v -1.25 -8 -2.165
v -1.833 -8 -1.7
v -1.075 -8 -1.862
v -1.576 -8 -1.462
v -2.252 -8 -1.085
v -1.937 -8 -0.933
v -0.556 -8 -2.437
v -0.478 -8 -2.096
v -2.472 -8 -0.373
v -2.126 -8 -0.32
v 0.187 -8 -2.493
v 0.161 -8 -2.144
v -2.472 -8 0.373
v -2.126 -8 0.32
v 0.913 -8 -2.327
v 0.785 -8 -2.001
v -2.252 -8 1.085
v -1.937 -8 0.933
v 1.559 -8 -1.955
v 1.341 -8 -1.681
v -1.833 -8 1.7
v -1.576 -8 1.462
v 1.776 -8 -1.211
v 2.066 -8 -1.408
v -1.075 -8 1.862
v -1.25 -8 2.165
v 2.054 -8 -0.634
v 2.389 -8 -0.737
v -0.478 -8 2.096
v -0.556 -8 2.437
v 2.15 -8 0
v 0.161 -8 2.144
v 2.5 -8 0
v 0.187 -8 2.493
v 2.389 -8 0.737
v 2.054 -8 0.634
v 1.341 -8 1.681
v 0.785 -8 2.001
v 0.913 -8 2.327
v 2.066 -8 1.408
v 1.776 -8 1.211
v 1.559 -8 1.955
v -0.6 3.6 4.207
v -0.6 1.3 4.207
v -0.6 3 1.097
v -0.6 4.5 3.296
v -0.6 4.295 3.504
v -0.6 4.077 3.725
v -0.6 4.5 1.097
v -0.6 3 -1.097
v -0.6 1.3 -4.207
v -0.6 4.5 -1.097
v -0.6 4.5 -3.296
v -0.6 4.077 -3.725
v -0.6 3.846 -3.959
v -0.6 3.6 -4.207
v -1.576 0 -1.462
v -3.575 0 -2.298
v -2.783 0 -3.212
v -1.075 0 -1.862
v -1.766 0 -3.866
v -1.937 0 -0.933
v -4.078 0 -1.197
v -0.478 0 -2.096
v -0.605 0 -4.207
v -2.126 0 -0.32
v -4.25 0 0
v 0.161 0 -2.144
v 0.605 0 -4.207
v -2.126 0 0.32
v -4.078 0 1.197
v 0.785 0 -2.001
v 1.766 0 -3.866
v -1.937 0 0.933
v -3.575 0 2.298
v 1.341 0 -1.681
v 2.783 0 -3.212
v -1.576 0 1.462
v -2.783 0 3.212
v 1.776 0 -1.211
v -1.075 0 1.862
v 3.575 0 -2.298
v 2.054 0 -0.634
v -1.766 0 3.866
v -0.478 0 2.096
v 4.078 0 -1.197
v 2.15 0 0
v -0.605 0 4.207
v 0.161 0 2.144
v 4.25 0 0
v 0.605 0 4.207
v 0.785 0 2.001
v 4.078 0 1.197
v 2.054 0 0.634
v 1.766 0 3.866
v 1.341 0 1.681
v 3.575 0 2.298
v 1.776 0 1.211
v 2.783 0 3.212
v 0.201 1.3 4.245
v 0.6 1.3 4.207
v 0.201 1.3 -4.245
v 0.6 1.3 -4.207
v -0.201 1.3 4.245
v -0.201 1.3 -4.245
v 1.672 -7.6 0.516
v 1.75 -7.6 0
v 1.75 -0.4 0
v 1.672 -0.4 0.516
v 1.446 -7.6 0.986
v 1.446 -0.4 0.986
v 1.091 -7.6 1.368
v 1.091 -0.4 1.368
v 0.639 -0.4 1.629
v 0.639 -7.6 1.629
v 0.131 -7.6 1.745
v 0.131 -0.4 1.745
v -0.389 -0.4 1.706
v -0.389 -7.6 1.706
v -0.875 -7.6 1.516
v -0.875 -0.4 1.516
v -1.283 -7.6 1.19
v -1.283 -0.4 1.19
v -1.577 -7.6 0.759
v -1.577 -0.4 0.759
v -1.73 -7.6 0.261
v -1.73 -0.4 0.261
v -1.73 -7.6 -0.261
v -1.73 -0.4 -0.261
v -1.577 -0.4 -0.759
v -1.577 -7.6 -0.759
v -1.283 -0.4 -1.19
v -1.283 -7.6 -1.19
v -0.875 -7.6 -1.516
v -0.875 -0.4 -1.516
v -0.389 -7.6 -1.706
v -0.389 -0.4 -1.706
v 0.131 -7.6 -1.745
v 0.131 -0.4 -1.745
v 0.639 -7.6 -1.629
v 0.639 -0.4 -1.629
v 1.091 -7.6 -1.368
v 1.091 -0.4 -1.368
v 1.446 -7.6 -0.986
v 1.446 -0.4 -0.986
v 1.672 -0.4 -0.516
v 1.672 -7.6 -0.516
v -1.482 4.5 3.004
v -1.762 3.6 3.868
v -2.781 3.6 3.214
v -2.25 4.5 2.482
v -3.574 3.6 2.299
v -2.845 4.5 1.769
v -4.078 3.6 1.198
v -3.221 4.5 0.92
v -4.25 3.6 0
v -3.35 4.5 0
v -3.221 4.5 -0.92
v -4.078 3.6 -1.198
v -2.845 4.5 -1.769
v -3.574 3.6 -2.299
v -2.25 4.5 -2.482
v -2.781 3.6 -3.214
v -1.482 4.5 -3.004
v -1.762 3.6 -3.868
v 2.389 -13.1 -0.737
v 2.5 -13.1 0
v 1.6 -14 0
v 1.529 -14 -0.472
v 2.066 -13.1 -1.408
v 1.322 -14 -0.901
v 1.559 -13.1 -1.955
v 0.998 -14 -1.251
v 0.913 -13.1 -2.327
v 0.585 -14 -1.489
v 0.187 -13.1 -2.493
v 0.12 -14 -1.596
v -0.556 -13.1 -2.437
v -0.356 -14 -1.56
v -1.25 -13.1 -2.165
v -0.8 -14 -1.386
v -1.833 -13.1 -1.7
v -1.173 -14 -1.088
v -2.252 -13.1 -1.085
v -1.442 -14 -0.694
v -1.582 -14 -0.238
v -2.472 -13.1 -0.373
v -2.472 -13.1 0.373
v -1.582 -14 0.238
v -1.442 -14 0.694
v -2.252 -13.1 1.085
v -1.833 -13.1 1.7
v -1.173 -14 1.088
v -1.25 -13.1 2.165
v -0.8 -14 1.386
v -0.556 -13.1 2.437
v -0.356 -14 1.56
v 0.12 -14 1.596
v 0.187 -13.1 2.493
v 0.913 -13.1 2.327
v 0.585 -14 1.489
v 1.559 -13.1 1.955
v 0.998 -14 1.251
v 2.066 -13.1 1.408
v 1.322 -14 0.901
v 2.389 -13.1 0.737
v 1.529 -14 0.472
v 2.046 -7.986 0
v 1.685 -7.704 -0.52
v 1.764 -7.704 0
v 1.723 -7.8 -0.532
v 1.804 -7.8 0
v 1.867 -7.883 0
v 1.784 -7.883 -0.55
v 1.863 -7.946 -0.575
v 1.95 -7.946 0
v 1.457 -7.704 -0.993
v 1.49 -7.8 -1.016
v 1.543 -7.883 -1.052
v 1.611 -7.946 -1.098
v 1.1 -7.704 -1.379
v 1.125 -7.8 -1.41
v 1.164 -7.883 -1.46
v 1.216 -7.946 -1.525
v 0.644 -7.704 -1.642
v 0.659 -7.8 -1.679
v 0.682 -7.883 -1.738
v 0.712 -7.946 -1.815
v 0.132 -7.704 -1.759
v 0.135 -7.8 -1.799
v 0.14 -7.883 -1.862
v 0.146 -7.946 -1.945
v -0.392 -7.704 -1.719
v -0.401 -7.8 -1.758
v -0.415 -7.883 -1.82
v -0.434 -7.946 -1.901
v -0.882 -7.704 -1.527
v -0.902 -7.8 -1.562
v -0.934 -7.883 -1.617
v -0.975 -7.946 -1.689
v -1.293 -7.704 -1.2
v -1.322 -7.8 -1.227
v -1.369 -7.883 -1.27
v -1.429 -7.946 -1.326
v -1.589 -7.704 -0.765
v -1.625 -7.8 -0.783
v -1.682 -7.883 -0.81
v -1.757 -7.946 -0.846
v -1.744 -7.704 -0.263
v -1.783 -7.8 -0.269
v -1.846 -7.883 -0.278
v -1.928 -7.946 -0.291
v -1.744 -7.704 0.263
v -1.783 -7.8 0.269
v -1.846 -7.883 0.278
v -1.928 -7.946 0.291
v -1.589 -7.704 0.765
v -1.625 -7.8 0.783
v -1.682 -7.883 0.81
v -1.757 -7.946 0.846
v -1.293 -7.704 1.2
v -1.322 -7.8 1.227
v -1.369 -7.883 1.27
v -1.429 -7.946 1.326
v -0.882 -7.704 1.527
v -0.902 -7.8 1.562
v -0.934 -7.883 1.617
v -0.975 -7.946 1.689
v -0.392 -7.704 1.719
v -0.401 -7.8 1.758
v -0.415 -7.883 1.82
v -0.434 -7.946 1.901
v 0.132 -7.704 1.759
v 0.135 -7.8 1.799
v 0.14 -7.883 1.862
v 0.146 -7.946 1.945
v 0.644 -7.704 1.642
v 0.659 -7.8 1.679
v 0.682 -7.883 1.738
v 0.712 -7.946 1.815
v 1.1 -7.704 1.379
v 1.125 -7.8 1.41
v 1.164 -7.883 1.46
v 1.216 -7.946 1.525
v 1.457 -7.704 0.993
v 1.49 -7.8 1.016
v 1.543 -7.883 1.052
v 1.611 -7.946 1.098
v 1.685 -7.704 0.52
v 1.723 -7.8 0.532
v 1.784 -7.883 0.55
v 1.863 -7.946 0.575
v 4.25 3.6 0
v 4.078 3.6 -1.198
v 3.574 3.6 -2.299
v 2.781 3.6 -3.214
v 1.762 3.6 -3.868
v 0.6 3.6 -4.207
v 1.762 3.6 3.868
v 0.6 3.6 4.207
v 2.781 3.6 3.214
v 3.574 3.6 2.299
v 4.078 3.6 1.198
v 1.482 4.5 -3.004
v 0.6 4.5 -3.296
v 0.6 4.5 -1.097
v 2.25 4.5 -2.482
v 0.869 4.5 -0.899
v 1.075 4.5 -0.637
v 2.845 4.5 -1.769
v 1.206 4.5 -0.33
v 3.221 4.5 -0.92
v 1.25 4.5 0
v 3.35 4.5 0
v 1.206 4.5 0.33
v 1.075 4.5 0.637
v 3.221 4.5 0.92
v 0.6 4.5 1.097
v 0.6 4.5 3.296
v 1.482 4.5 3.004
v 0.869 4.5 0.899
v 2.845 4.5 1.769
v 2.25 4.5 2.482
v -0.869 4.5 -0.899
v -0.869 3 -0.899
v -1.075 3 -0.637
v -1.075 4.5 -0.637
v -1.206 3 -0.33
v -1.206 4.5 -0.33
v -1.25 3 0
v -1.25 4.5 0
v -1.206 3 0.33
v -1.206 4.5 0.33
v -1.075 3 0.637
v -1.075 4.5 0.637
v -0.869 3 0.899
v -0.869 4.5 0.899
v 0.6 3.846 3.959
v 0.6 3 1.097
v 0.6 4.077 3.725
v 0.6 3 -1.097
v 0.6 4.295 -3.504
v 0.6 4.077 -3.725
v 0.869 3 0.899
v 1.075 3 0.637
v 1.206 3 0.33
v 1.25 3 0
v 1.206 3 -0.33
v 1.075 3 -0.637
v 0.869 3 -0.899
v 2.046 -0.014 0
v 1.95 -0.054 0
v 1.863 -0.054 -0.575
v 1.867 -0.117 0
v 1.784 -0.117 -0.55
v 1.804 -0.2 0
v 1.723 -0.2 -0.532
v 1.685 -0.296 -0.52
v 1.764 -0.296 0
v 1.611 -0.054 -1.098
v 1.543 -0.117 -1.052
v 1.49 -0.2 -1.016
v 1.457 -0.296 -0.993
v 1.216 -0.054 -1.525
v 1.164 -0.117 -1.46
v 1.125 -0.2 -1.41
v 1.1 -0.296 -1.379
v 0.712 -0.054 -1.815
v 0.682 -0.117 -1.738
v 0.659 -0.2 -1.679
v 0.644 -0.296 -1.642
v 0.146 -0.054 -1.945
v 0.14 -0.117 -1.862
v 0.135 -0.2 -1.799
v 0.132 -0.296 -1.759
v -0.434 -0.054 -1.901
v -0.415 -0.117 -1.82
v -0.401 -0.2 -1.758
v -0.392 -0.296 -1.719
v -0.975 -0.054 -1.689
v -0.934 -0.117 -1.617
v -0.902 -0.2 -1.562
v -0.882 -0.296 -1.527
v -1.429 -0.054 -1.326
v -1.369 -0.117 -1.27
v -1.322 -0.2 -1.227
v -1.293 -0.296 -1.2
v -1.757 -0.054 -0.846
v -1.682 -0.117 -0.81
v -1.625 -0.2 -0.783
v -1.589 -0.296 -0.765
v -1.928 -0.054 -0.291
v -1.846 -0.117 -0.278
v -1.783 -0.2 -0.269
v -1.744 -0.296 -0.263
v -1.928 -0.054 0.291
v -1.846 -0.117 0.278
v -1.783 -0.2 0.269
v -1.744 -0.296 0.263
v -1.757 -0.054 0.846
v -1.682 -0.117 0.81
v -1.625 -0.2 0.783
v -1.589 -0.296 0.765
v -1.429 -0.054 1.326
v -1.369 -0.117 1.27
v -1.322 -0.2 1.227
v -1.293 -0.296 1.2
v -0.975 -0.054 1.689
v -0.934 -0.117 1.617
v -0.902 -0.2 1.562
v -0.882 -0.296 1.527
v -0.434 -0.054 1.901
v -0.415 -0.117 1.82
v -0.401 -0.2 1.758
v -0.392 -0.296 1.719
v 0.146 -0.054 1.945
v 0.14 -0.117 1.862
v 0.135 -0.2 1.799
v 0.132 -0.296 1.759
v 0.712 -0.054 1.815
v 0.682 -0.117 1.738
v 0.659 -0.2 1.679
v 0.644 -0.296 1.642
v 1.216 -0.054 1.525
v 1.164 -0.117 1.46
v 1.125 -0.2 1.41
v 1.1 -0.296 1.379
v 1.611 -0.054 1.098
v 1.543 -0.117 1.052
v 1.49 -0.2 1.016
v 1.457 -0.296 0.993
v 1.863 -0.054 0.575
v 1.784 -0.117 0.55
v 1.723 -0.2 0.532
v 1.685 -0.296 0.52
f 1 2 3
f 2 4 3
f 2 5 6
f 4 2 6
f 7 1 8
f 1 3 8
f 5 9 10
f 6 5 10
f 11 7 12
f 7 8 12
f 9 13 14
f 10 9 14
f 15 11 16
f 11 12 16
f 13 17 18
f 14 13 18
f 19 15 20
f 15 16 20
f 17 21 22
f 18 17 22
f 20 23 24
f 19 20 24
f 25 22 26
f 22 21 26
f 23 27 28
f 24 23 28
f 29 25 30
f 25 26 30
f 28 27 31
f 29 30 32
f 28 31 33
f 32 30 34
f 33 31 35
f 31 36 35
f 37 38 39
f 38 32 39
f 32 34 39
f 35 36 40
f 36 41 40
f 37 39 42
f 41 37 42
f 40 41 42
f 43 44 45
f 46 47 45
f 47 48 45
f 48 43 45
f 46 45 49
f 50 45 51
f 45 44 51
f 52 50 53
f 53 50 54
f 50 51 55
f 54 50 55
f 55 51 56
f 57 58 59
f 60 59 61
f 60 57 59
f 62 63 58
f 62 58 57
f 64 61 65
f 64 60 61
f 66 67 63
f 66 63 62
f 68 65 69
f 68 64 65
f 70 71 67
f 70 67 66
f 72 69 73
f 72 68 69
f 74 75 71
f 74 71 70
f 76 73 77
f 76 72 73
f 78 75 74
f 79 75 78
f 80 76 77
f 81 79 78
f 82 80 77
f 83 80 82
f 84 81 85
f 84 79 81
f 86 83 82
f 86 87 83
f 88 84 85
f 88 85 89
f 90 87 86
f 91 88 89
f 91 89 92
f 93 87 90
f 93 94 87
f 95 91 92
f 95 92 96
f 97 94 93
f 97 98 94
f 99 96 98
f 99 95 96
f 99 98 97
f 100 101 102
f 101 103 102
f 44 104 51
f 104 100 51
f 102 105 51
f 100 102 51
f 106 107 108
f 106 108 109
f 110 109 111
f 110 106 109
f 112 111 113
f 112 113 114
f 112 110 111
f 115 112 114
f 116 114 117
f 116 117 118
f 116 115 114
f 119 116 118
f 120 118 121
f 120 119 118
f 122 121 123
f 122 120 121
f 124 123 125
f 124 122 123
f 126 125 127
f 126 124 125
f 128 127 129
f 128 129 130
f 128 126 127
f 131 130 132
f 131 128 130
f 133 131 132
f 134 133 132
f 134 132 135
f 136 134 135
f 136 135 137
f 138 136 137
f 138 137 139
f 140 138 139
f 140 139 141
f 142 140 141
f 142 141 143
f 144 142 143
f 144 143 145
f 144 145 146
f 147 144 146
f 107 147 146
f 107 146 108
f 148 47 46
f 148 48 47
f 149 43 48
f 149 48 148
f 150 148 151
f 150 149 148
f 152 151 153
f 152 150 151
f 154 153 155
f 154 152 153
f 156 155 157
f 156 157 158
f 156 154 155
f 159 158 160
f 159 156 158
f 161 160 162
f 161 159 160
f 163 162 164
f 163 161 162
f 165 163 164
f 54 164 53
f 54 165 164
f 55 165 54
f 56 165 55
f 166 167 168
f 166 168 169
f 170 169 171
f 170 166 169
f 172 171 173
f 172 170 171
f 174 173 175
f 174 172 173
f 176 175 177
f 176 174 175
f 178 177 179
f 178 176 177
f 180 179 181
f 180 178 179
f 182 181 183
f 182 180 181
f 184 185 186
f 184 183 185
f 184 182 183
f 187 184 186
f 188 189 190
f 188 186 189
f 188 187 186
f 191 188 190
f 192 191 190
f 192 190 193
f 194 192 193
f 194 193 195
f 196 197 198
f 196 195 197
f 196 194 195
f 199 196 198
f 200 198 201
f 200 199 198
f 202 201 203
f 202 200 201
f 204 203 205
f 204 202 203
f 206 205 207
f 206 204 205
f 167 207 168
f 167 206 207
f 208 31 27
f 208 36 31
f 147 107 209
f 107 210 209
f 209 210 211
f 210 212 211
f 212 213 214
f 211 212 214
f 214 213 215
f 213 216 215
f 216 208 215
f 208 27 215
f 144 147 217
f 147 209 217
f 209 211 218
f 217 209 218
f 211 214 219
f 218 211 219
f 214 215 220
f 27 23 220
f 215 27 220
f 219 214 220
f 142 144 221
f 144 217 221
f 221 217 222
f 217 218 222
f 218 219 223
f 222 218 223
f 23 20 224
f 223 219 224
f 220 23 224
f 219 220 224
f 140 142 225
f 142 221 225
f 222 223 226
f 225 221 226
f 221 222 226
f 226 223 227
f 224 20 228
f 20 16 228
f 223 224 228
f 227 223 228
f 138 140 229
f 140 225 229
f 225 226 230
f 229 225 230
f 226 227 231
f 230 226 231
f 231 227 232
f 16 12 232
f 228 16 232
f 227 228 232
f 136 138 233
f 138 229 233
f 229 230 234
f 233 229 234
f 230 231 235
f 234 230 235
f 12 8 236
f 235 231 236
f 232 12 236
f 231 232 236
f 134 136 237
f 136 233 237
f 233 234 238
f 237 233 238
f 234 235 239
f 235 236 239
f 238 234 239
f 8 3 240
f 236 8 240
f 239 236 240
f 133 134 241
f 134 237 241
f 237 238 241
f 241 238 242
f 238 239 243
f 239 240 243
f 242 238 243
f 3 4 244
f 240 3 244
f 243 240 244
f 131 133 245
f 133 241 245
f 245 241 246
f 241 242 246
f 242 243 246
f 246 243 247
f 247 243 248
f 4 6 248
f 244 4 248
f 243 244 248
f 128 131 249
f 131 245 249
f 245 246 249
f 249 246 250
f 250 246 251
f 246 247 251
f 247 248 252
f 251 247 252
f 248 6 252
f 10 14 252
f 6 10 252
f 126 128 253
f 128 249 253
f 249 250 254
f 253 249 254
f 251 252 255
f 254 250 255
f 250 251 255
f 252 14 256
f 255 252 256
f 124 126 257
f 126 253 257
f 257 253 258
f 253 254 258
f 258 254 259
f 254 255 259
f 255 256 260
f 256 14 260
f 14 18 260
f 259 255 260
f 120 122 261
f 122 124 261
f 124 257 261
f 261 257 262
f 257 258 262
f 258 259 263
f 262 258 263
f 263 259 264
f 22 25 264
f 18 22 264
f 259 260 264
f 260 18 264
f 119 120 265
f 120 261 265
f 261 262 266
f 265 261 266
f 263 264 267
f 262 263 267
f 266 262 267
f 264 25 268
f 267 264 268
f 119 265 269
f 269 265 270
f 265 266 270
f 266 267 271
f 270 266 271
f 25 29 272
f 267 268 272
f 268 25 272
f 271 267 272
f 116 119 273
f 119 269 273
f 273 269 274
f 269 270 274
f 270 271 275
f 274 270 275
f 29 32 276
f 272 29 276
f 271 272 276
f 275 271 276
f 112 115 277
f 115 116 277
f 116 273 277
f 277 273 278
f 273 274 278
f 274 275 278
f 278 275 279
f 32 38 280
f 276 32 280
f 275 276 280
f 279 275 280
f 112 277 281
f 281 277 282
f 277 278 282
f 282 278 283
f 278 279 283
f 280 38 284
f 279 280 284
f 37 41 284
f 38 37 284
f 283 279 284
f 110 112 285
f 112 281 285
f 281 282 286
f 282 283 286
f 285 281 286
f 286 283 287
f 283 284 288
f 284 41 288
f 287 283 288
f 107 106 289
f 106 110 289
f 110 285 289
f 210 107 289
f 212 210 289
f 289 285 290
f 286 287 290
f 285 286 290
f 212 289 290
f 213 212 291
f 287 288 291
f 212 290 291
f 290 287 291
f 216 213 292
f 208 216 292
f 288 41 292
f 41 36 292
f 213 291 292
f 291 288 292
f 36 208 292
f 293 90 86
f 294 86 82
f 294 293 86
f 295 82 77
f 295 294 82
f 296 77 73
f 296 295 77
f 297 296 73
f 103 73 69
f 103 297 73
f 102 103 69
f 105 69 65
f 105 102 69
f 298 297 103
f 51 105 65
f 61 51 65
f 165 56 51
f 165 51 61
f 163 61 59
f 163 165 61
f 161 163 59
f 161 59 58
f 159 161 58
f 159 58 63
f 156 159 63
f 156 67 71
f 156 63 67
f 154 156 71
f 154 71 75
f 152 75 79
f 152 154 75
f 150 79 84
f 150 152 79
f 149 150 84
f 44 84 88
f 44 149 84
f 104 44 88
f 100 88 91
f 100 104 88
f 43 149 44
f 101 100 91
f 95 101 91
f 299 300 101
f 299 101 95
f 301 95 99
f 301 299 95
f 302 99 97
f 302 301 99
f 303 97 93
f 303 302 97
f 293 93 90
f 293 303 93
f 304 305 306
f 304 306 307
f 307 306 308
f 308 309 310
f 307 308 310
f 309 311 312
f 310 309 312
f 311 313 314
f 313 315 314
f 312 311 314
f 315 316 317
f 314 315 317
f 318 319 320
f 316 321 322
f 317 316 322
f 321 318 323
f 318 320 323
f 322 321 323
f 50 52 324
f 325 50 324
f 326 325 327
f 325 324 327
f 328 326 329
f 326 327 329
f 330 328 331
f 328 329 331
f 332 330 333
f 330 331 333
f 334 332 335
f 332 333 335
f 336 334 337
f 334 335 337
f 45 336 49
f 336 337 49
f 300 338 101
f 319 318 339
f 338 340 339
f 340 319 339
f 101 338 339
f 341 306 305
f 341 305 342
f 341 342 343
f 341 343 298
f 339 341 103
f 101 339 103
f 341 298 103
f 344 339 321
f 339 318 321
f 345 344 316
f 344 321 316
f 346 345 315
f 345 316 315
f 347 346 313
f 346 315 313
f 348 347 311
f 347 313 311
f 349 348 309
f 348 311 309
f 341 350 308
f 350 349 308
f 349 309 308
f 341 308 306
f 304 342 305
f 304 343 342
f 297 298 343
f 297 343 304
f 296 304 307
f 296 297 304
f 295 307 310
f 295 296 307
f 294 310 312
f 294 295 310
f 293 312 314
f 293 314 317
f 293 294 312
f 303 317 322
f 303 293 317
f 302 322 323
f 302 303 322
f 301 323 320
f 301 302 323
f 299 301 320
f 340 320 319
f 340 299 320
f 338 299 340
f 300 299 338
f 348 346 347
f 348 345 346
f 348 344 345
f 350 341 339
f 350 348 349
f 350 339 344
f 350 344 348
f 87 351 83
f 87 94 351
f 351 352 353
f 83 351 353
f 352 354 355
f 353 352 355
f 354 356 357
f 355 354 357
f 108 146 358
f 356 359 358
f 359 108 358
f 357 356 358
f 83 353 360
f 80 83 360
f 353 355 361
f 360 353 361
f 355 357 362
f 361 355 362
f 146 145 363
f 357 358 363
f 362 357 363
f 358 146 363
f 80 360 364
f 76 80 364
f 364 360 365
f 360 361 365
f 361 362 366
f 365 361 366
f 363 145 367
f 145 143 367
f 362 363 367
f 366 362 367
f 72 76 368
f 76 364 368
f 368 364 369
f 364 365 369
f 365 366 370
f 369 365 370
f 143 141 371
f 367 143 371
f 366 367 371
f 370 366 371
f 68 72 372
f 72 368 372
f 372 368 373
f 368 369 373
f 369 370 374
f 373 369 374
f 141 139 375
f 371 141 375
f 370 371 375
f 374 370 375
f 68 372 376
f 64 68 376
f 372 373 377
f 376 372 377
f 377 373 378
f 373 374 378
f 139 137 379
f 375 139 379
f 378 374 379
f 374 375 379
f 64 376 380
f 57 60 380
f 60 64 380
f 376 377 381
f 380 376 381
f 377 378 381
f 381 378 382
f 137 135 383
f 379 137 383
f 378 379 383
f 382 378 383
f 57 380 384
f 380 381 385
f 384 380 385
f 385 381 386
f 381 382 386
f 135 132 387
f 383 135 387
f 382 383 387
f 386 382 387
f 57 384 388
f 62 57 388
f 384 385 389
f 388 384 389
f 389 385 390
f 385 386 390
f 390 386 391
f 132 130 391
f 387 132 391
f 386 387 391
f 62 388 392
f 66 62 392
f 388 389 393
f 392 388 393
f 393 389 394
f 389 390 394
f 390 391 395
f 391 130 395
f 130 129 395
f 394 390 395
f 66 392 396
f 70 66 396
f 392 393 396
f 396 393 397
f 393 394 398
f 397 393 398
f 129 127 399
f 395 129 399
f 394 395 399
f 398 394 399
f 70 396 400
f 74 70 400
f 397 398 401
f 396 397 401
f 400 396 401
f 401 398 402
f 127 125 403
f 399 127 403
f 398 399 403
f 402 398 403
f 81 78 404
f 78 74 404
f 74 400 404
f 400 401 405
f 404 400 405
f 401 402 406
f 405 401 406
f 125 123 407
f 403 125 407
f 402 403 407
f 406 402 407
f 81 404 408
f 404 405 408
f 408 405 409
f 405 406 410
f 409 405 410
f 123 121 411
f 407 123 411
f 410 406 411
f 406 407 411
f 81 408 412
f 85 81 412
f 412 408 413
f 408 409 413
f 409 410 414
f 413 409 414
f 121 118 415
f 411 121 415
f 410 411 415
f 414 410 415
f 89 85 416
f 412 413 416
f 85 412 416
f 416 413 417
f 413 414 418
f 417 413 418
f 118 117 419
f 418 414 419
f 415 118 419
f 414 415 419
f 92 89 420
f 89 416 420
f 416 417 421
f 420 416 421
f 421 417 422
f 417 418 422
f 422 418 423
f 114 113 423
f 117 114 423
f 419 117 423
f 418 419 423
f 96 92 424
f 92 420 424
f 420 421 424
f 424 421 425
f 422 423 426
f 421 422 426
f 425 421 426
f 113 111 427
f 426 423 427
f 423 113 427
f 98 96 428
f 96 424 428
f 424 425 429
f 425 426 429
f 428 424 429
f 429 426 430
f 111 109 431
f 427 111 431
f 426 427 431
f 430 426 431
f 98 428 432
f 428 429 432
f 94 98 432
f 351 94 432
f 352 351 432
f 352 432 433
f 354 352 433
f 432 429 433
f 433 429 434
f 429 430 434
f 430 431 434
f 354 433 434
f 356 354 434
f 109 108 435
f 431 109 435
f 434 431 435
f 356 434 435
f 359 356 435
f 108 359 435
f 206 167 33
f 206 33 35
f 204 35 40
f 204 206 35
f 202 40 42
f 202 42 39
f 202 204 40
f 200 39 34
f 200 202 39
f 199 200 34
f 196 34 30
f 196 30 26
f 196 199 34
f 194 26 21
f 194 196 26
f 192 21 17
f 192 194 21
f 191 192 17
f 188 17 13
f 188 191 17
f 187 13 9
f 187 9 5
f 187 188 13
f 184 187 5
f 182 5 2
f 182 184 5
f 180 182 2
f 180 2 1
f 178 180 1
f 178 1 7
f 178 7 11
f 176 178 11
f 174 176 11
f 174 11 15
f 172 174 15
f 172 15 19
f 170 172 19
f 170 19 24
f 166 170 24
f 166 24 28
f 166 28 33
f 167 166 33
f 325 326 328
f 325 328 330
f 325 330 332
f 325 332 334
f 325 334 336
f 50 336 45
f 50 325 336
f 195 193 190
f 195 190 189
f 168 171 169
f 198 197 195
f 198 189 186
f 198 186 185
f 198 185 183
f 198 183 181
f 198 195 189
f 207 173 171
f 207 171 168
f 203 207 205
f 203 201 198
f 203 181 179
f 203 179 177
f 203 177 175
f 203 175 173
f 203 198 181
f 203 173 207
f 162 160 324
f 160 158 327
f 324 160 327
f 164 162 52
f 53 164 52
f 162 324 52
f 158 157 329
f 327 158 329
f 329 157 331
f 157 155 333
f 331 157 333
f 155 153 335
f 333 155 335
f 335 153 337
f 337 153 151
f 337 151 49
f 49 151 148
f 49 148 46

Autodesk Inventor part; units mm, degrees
ref_plane "YZ Plane" through (0, 0, 0) normal (1, 0, 0) x (0, 1, 0)
ref_plane "XZ Plane" through (0, 0, 0) normal (0, 1, 0) x (-1, 0, 0)
ref_plane "XY Plane" through (0, 0, 0) normal (0, 0, 1) x (1, 0, 0)
sketch "Sketch1" plane through (0, 0, 0) normal (0, 0, 1) x (1, 0, 0)
  line L0 (4.25, 0) -> (4.25, 4.5)
  line L1 (4.25, 4.5) -> (0, 4.5)
  line L2 (4.25, 0) -> (1.75, 0)
  line L3 (1.75, 0) -> (1.75, -8)
  line L4 (1.75, -8) -> (2.5, -8)
  line L5 (2.5, -8) -> (2.5, -14)
  line L6 (2.5, -14) -> (0, -14)
  line L7 (0, 4.5) -> (0, -14)
  point P0 (0, 0)
  dimension "d0" = 8.5
  dimension "d2" = 3.5
  dimension "d3" = 5
  dimension "d4" = 4.5
  dimension "d5" = 6
  dimension "d6" = 14
revolve "Вращение1" add sketch "Sketch1" angle 360 about axis through (0, 4.5, 0) along (0, -1, 0)
sketch "Sketch2" plane through (0, 4.5, 0) normal (0, 1, 0) x (1, 0, 0)
  circle A0 centre (0, 0) radius 4.25 construction
  circle A1 centre (0, 0) radius 1.25
  dimension "d31" = 2.5
extrude "Выдавливание1" cut sketch "Sketch2" against normal blind 1.5
chamfer "Фаска1" distance 0.9 angle 45 1 edges at (-4.25, 4.5, 0)
sketch "Sketch3" plane through (0, 0, 0) normal (0, 0, 1) x (1, 0, 0)
  line L0 (0, 0) -> (0, 4.5)
  line L1 (-2.3552, 0) -> (2.3552, 0) construction
  line L2 (-4.25, 4.5) -> (4.25, 4.5) construction
  line L3 (-0.6, 4.5) -> (0.6, 4.5)
  line L4 (0.6, 4.5) -> (0.6, 1.3)
  line L5 (0.6, 1.3) -> (-0.6, 1.3)
  line L6 (-0.6, 1.3) -> (-0.6, 4.5)
  dimension "d8" = 1.3
  dimension "d9" = 1.2
extrude "Выдавливание2" cut sketch "Sketch3" along normal through all both and the other way through all
fillet "Сопряжение1" radius 0.4 2 edges at (-1.75, 0, 0) (-1.75, -8, 0)
thread "Резьба1" size "M5x0.8" class "6g" standard "ISO Metric profile" length 6
chamfer "Фаска2" distance 0.9 angle 45 1 edges at (-2.5, -14, 0)
equation "\"d31\" = d3_"
equation "\"d32\" = h3"
equation "\"d21\" = C1"
equation "\"d8\" = h2"
equation "\"d9\" = n"
equation "\"d12\" = R"
equation "\"d13\" = b"
equation "\"d15\" = C1"
equation "\"d0\" = D"
equation "\"d2\" = d1"
equation "\"d3\" = d_"
equation "\"d4\" = k1"
equation "\"d5\" = b"
equation "\"d6\" = l_"
equation "\"D\" = 8.5"
equation "\"d_\" = 5"
equation "\"l_\" = 14"
equation "\"b\" = 6"
equation "\"d1\" = 3.5"
equation "\"R\" = 0.4"
equation "\"C1\" = 0.9"
equation "\"h2\" = 1.3"
equation "\"n\" = 1.2"
equation "\"h3\" = 1.5"
equation "\"k1\" = 4.5"
equation "\"d3_\" = 2.5"
equation "\"G\" = l_ - b"
properties part number "Винт 3 M5-6gx14 ГОСТ 10336-80" material "Сталь, мягкая"
